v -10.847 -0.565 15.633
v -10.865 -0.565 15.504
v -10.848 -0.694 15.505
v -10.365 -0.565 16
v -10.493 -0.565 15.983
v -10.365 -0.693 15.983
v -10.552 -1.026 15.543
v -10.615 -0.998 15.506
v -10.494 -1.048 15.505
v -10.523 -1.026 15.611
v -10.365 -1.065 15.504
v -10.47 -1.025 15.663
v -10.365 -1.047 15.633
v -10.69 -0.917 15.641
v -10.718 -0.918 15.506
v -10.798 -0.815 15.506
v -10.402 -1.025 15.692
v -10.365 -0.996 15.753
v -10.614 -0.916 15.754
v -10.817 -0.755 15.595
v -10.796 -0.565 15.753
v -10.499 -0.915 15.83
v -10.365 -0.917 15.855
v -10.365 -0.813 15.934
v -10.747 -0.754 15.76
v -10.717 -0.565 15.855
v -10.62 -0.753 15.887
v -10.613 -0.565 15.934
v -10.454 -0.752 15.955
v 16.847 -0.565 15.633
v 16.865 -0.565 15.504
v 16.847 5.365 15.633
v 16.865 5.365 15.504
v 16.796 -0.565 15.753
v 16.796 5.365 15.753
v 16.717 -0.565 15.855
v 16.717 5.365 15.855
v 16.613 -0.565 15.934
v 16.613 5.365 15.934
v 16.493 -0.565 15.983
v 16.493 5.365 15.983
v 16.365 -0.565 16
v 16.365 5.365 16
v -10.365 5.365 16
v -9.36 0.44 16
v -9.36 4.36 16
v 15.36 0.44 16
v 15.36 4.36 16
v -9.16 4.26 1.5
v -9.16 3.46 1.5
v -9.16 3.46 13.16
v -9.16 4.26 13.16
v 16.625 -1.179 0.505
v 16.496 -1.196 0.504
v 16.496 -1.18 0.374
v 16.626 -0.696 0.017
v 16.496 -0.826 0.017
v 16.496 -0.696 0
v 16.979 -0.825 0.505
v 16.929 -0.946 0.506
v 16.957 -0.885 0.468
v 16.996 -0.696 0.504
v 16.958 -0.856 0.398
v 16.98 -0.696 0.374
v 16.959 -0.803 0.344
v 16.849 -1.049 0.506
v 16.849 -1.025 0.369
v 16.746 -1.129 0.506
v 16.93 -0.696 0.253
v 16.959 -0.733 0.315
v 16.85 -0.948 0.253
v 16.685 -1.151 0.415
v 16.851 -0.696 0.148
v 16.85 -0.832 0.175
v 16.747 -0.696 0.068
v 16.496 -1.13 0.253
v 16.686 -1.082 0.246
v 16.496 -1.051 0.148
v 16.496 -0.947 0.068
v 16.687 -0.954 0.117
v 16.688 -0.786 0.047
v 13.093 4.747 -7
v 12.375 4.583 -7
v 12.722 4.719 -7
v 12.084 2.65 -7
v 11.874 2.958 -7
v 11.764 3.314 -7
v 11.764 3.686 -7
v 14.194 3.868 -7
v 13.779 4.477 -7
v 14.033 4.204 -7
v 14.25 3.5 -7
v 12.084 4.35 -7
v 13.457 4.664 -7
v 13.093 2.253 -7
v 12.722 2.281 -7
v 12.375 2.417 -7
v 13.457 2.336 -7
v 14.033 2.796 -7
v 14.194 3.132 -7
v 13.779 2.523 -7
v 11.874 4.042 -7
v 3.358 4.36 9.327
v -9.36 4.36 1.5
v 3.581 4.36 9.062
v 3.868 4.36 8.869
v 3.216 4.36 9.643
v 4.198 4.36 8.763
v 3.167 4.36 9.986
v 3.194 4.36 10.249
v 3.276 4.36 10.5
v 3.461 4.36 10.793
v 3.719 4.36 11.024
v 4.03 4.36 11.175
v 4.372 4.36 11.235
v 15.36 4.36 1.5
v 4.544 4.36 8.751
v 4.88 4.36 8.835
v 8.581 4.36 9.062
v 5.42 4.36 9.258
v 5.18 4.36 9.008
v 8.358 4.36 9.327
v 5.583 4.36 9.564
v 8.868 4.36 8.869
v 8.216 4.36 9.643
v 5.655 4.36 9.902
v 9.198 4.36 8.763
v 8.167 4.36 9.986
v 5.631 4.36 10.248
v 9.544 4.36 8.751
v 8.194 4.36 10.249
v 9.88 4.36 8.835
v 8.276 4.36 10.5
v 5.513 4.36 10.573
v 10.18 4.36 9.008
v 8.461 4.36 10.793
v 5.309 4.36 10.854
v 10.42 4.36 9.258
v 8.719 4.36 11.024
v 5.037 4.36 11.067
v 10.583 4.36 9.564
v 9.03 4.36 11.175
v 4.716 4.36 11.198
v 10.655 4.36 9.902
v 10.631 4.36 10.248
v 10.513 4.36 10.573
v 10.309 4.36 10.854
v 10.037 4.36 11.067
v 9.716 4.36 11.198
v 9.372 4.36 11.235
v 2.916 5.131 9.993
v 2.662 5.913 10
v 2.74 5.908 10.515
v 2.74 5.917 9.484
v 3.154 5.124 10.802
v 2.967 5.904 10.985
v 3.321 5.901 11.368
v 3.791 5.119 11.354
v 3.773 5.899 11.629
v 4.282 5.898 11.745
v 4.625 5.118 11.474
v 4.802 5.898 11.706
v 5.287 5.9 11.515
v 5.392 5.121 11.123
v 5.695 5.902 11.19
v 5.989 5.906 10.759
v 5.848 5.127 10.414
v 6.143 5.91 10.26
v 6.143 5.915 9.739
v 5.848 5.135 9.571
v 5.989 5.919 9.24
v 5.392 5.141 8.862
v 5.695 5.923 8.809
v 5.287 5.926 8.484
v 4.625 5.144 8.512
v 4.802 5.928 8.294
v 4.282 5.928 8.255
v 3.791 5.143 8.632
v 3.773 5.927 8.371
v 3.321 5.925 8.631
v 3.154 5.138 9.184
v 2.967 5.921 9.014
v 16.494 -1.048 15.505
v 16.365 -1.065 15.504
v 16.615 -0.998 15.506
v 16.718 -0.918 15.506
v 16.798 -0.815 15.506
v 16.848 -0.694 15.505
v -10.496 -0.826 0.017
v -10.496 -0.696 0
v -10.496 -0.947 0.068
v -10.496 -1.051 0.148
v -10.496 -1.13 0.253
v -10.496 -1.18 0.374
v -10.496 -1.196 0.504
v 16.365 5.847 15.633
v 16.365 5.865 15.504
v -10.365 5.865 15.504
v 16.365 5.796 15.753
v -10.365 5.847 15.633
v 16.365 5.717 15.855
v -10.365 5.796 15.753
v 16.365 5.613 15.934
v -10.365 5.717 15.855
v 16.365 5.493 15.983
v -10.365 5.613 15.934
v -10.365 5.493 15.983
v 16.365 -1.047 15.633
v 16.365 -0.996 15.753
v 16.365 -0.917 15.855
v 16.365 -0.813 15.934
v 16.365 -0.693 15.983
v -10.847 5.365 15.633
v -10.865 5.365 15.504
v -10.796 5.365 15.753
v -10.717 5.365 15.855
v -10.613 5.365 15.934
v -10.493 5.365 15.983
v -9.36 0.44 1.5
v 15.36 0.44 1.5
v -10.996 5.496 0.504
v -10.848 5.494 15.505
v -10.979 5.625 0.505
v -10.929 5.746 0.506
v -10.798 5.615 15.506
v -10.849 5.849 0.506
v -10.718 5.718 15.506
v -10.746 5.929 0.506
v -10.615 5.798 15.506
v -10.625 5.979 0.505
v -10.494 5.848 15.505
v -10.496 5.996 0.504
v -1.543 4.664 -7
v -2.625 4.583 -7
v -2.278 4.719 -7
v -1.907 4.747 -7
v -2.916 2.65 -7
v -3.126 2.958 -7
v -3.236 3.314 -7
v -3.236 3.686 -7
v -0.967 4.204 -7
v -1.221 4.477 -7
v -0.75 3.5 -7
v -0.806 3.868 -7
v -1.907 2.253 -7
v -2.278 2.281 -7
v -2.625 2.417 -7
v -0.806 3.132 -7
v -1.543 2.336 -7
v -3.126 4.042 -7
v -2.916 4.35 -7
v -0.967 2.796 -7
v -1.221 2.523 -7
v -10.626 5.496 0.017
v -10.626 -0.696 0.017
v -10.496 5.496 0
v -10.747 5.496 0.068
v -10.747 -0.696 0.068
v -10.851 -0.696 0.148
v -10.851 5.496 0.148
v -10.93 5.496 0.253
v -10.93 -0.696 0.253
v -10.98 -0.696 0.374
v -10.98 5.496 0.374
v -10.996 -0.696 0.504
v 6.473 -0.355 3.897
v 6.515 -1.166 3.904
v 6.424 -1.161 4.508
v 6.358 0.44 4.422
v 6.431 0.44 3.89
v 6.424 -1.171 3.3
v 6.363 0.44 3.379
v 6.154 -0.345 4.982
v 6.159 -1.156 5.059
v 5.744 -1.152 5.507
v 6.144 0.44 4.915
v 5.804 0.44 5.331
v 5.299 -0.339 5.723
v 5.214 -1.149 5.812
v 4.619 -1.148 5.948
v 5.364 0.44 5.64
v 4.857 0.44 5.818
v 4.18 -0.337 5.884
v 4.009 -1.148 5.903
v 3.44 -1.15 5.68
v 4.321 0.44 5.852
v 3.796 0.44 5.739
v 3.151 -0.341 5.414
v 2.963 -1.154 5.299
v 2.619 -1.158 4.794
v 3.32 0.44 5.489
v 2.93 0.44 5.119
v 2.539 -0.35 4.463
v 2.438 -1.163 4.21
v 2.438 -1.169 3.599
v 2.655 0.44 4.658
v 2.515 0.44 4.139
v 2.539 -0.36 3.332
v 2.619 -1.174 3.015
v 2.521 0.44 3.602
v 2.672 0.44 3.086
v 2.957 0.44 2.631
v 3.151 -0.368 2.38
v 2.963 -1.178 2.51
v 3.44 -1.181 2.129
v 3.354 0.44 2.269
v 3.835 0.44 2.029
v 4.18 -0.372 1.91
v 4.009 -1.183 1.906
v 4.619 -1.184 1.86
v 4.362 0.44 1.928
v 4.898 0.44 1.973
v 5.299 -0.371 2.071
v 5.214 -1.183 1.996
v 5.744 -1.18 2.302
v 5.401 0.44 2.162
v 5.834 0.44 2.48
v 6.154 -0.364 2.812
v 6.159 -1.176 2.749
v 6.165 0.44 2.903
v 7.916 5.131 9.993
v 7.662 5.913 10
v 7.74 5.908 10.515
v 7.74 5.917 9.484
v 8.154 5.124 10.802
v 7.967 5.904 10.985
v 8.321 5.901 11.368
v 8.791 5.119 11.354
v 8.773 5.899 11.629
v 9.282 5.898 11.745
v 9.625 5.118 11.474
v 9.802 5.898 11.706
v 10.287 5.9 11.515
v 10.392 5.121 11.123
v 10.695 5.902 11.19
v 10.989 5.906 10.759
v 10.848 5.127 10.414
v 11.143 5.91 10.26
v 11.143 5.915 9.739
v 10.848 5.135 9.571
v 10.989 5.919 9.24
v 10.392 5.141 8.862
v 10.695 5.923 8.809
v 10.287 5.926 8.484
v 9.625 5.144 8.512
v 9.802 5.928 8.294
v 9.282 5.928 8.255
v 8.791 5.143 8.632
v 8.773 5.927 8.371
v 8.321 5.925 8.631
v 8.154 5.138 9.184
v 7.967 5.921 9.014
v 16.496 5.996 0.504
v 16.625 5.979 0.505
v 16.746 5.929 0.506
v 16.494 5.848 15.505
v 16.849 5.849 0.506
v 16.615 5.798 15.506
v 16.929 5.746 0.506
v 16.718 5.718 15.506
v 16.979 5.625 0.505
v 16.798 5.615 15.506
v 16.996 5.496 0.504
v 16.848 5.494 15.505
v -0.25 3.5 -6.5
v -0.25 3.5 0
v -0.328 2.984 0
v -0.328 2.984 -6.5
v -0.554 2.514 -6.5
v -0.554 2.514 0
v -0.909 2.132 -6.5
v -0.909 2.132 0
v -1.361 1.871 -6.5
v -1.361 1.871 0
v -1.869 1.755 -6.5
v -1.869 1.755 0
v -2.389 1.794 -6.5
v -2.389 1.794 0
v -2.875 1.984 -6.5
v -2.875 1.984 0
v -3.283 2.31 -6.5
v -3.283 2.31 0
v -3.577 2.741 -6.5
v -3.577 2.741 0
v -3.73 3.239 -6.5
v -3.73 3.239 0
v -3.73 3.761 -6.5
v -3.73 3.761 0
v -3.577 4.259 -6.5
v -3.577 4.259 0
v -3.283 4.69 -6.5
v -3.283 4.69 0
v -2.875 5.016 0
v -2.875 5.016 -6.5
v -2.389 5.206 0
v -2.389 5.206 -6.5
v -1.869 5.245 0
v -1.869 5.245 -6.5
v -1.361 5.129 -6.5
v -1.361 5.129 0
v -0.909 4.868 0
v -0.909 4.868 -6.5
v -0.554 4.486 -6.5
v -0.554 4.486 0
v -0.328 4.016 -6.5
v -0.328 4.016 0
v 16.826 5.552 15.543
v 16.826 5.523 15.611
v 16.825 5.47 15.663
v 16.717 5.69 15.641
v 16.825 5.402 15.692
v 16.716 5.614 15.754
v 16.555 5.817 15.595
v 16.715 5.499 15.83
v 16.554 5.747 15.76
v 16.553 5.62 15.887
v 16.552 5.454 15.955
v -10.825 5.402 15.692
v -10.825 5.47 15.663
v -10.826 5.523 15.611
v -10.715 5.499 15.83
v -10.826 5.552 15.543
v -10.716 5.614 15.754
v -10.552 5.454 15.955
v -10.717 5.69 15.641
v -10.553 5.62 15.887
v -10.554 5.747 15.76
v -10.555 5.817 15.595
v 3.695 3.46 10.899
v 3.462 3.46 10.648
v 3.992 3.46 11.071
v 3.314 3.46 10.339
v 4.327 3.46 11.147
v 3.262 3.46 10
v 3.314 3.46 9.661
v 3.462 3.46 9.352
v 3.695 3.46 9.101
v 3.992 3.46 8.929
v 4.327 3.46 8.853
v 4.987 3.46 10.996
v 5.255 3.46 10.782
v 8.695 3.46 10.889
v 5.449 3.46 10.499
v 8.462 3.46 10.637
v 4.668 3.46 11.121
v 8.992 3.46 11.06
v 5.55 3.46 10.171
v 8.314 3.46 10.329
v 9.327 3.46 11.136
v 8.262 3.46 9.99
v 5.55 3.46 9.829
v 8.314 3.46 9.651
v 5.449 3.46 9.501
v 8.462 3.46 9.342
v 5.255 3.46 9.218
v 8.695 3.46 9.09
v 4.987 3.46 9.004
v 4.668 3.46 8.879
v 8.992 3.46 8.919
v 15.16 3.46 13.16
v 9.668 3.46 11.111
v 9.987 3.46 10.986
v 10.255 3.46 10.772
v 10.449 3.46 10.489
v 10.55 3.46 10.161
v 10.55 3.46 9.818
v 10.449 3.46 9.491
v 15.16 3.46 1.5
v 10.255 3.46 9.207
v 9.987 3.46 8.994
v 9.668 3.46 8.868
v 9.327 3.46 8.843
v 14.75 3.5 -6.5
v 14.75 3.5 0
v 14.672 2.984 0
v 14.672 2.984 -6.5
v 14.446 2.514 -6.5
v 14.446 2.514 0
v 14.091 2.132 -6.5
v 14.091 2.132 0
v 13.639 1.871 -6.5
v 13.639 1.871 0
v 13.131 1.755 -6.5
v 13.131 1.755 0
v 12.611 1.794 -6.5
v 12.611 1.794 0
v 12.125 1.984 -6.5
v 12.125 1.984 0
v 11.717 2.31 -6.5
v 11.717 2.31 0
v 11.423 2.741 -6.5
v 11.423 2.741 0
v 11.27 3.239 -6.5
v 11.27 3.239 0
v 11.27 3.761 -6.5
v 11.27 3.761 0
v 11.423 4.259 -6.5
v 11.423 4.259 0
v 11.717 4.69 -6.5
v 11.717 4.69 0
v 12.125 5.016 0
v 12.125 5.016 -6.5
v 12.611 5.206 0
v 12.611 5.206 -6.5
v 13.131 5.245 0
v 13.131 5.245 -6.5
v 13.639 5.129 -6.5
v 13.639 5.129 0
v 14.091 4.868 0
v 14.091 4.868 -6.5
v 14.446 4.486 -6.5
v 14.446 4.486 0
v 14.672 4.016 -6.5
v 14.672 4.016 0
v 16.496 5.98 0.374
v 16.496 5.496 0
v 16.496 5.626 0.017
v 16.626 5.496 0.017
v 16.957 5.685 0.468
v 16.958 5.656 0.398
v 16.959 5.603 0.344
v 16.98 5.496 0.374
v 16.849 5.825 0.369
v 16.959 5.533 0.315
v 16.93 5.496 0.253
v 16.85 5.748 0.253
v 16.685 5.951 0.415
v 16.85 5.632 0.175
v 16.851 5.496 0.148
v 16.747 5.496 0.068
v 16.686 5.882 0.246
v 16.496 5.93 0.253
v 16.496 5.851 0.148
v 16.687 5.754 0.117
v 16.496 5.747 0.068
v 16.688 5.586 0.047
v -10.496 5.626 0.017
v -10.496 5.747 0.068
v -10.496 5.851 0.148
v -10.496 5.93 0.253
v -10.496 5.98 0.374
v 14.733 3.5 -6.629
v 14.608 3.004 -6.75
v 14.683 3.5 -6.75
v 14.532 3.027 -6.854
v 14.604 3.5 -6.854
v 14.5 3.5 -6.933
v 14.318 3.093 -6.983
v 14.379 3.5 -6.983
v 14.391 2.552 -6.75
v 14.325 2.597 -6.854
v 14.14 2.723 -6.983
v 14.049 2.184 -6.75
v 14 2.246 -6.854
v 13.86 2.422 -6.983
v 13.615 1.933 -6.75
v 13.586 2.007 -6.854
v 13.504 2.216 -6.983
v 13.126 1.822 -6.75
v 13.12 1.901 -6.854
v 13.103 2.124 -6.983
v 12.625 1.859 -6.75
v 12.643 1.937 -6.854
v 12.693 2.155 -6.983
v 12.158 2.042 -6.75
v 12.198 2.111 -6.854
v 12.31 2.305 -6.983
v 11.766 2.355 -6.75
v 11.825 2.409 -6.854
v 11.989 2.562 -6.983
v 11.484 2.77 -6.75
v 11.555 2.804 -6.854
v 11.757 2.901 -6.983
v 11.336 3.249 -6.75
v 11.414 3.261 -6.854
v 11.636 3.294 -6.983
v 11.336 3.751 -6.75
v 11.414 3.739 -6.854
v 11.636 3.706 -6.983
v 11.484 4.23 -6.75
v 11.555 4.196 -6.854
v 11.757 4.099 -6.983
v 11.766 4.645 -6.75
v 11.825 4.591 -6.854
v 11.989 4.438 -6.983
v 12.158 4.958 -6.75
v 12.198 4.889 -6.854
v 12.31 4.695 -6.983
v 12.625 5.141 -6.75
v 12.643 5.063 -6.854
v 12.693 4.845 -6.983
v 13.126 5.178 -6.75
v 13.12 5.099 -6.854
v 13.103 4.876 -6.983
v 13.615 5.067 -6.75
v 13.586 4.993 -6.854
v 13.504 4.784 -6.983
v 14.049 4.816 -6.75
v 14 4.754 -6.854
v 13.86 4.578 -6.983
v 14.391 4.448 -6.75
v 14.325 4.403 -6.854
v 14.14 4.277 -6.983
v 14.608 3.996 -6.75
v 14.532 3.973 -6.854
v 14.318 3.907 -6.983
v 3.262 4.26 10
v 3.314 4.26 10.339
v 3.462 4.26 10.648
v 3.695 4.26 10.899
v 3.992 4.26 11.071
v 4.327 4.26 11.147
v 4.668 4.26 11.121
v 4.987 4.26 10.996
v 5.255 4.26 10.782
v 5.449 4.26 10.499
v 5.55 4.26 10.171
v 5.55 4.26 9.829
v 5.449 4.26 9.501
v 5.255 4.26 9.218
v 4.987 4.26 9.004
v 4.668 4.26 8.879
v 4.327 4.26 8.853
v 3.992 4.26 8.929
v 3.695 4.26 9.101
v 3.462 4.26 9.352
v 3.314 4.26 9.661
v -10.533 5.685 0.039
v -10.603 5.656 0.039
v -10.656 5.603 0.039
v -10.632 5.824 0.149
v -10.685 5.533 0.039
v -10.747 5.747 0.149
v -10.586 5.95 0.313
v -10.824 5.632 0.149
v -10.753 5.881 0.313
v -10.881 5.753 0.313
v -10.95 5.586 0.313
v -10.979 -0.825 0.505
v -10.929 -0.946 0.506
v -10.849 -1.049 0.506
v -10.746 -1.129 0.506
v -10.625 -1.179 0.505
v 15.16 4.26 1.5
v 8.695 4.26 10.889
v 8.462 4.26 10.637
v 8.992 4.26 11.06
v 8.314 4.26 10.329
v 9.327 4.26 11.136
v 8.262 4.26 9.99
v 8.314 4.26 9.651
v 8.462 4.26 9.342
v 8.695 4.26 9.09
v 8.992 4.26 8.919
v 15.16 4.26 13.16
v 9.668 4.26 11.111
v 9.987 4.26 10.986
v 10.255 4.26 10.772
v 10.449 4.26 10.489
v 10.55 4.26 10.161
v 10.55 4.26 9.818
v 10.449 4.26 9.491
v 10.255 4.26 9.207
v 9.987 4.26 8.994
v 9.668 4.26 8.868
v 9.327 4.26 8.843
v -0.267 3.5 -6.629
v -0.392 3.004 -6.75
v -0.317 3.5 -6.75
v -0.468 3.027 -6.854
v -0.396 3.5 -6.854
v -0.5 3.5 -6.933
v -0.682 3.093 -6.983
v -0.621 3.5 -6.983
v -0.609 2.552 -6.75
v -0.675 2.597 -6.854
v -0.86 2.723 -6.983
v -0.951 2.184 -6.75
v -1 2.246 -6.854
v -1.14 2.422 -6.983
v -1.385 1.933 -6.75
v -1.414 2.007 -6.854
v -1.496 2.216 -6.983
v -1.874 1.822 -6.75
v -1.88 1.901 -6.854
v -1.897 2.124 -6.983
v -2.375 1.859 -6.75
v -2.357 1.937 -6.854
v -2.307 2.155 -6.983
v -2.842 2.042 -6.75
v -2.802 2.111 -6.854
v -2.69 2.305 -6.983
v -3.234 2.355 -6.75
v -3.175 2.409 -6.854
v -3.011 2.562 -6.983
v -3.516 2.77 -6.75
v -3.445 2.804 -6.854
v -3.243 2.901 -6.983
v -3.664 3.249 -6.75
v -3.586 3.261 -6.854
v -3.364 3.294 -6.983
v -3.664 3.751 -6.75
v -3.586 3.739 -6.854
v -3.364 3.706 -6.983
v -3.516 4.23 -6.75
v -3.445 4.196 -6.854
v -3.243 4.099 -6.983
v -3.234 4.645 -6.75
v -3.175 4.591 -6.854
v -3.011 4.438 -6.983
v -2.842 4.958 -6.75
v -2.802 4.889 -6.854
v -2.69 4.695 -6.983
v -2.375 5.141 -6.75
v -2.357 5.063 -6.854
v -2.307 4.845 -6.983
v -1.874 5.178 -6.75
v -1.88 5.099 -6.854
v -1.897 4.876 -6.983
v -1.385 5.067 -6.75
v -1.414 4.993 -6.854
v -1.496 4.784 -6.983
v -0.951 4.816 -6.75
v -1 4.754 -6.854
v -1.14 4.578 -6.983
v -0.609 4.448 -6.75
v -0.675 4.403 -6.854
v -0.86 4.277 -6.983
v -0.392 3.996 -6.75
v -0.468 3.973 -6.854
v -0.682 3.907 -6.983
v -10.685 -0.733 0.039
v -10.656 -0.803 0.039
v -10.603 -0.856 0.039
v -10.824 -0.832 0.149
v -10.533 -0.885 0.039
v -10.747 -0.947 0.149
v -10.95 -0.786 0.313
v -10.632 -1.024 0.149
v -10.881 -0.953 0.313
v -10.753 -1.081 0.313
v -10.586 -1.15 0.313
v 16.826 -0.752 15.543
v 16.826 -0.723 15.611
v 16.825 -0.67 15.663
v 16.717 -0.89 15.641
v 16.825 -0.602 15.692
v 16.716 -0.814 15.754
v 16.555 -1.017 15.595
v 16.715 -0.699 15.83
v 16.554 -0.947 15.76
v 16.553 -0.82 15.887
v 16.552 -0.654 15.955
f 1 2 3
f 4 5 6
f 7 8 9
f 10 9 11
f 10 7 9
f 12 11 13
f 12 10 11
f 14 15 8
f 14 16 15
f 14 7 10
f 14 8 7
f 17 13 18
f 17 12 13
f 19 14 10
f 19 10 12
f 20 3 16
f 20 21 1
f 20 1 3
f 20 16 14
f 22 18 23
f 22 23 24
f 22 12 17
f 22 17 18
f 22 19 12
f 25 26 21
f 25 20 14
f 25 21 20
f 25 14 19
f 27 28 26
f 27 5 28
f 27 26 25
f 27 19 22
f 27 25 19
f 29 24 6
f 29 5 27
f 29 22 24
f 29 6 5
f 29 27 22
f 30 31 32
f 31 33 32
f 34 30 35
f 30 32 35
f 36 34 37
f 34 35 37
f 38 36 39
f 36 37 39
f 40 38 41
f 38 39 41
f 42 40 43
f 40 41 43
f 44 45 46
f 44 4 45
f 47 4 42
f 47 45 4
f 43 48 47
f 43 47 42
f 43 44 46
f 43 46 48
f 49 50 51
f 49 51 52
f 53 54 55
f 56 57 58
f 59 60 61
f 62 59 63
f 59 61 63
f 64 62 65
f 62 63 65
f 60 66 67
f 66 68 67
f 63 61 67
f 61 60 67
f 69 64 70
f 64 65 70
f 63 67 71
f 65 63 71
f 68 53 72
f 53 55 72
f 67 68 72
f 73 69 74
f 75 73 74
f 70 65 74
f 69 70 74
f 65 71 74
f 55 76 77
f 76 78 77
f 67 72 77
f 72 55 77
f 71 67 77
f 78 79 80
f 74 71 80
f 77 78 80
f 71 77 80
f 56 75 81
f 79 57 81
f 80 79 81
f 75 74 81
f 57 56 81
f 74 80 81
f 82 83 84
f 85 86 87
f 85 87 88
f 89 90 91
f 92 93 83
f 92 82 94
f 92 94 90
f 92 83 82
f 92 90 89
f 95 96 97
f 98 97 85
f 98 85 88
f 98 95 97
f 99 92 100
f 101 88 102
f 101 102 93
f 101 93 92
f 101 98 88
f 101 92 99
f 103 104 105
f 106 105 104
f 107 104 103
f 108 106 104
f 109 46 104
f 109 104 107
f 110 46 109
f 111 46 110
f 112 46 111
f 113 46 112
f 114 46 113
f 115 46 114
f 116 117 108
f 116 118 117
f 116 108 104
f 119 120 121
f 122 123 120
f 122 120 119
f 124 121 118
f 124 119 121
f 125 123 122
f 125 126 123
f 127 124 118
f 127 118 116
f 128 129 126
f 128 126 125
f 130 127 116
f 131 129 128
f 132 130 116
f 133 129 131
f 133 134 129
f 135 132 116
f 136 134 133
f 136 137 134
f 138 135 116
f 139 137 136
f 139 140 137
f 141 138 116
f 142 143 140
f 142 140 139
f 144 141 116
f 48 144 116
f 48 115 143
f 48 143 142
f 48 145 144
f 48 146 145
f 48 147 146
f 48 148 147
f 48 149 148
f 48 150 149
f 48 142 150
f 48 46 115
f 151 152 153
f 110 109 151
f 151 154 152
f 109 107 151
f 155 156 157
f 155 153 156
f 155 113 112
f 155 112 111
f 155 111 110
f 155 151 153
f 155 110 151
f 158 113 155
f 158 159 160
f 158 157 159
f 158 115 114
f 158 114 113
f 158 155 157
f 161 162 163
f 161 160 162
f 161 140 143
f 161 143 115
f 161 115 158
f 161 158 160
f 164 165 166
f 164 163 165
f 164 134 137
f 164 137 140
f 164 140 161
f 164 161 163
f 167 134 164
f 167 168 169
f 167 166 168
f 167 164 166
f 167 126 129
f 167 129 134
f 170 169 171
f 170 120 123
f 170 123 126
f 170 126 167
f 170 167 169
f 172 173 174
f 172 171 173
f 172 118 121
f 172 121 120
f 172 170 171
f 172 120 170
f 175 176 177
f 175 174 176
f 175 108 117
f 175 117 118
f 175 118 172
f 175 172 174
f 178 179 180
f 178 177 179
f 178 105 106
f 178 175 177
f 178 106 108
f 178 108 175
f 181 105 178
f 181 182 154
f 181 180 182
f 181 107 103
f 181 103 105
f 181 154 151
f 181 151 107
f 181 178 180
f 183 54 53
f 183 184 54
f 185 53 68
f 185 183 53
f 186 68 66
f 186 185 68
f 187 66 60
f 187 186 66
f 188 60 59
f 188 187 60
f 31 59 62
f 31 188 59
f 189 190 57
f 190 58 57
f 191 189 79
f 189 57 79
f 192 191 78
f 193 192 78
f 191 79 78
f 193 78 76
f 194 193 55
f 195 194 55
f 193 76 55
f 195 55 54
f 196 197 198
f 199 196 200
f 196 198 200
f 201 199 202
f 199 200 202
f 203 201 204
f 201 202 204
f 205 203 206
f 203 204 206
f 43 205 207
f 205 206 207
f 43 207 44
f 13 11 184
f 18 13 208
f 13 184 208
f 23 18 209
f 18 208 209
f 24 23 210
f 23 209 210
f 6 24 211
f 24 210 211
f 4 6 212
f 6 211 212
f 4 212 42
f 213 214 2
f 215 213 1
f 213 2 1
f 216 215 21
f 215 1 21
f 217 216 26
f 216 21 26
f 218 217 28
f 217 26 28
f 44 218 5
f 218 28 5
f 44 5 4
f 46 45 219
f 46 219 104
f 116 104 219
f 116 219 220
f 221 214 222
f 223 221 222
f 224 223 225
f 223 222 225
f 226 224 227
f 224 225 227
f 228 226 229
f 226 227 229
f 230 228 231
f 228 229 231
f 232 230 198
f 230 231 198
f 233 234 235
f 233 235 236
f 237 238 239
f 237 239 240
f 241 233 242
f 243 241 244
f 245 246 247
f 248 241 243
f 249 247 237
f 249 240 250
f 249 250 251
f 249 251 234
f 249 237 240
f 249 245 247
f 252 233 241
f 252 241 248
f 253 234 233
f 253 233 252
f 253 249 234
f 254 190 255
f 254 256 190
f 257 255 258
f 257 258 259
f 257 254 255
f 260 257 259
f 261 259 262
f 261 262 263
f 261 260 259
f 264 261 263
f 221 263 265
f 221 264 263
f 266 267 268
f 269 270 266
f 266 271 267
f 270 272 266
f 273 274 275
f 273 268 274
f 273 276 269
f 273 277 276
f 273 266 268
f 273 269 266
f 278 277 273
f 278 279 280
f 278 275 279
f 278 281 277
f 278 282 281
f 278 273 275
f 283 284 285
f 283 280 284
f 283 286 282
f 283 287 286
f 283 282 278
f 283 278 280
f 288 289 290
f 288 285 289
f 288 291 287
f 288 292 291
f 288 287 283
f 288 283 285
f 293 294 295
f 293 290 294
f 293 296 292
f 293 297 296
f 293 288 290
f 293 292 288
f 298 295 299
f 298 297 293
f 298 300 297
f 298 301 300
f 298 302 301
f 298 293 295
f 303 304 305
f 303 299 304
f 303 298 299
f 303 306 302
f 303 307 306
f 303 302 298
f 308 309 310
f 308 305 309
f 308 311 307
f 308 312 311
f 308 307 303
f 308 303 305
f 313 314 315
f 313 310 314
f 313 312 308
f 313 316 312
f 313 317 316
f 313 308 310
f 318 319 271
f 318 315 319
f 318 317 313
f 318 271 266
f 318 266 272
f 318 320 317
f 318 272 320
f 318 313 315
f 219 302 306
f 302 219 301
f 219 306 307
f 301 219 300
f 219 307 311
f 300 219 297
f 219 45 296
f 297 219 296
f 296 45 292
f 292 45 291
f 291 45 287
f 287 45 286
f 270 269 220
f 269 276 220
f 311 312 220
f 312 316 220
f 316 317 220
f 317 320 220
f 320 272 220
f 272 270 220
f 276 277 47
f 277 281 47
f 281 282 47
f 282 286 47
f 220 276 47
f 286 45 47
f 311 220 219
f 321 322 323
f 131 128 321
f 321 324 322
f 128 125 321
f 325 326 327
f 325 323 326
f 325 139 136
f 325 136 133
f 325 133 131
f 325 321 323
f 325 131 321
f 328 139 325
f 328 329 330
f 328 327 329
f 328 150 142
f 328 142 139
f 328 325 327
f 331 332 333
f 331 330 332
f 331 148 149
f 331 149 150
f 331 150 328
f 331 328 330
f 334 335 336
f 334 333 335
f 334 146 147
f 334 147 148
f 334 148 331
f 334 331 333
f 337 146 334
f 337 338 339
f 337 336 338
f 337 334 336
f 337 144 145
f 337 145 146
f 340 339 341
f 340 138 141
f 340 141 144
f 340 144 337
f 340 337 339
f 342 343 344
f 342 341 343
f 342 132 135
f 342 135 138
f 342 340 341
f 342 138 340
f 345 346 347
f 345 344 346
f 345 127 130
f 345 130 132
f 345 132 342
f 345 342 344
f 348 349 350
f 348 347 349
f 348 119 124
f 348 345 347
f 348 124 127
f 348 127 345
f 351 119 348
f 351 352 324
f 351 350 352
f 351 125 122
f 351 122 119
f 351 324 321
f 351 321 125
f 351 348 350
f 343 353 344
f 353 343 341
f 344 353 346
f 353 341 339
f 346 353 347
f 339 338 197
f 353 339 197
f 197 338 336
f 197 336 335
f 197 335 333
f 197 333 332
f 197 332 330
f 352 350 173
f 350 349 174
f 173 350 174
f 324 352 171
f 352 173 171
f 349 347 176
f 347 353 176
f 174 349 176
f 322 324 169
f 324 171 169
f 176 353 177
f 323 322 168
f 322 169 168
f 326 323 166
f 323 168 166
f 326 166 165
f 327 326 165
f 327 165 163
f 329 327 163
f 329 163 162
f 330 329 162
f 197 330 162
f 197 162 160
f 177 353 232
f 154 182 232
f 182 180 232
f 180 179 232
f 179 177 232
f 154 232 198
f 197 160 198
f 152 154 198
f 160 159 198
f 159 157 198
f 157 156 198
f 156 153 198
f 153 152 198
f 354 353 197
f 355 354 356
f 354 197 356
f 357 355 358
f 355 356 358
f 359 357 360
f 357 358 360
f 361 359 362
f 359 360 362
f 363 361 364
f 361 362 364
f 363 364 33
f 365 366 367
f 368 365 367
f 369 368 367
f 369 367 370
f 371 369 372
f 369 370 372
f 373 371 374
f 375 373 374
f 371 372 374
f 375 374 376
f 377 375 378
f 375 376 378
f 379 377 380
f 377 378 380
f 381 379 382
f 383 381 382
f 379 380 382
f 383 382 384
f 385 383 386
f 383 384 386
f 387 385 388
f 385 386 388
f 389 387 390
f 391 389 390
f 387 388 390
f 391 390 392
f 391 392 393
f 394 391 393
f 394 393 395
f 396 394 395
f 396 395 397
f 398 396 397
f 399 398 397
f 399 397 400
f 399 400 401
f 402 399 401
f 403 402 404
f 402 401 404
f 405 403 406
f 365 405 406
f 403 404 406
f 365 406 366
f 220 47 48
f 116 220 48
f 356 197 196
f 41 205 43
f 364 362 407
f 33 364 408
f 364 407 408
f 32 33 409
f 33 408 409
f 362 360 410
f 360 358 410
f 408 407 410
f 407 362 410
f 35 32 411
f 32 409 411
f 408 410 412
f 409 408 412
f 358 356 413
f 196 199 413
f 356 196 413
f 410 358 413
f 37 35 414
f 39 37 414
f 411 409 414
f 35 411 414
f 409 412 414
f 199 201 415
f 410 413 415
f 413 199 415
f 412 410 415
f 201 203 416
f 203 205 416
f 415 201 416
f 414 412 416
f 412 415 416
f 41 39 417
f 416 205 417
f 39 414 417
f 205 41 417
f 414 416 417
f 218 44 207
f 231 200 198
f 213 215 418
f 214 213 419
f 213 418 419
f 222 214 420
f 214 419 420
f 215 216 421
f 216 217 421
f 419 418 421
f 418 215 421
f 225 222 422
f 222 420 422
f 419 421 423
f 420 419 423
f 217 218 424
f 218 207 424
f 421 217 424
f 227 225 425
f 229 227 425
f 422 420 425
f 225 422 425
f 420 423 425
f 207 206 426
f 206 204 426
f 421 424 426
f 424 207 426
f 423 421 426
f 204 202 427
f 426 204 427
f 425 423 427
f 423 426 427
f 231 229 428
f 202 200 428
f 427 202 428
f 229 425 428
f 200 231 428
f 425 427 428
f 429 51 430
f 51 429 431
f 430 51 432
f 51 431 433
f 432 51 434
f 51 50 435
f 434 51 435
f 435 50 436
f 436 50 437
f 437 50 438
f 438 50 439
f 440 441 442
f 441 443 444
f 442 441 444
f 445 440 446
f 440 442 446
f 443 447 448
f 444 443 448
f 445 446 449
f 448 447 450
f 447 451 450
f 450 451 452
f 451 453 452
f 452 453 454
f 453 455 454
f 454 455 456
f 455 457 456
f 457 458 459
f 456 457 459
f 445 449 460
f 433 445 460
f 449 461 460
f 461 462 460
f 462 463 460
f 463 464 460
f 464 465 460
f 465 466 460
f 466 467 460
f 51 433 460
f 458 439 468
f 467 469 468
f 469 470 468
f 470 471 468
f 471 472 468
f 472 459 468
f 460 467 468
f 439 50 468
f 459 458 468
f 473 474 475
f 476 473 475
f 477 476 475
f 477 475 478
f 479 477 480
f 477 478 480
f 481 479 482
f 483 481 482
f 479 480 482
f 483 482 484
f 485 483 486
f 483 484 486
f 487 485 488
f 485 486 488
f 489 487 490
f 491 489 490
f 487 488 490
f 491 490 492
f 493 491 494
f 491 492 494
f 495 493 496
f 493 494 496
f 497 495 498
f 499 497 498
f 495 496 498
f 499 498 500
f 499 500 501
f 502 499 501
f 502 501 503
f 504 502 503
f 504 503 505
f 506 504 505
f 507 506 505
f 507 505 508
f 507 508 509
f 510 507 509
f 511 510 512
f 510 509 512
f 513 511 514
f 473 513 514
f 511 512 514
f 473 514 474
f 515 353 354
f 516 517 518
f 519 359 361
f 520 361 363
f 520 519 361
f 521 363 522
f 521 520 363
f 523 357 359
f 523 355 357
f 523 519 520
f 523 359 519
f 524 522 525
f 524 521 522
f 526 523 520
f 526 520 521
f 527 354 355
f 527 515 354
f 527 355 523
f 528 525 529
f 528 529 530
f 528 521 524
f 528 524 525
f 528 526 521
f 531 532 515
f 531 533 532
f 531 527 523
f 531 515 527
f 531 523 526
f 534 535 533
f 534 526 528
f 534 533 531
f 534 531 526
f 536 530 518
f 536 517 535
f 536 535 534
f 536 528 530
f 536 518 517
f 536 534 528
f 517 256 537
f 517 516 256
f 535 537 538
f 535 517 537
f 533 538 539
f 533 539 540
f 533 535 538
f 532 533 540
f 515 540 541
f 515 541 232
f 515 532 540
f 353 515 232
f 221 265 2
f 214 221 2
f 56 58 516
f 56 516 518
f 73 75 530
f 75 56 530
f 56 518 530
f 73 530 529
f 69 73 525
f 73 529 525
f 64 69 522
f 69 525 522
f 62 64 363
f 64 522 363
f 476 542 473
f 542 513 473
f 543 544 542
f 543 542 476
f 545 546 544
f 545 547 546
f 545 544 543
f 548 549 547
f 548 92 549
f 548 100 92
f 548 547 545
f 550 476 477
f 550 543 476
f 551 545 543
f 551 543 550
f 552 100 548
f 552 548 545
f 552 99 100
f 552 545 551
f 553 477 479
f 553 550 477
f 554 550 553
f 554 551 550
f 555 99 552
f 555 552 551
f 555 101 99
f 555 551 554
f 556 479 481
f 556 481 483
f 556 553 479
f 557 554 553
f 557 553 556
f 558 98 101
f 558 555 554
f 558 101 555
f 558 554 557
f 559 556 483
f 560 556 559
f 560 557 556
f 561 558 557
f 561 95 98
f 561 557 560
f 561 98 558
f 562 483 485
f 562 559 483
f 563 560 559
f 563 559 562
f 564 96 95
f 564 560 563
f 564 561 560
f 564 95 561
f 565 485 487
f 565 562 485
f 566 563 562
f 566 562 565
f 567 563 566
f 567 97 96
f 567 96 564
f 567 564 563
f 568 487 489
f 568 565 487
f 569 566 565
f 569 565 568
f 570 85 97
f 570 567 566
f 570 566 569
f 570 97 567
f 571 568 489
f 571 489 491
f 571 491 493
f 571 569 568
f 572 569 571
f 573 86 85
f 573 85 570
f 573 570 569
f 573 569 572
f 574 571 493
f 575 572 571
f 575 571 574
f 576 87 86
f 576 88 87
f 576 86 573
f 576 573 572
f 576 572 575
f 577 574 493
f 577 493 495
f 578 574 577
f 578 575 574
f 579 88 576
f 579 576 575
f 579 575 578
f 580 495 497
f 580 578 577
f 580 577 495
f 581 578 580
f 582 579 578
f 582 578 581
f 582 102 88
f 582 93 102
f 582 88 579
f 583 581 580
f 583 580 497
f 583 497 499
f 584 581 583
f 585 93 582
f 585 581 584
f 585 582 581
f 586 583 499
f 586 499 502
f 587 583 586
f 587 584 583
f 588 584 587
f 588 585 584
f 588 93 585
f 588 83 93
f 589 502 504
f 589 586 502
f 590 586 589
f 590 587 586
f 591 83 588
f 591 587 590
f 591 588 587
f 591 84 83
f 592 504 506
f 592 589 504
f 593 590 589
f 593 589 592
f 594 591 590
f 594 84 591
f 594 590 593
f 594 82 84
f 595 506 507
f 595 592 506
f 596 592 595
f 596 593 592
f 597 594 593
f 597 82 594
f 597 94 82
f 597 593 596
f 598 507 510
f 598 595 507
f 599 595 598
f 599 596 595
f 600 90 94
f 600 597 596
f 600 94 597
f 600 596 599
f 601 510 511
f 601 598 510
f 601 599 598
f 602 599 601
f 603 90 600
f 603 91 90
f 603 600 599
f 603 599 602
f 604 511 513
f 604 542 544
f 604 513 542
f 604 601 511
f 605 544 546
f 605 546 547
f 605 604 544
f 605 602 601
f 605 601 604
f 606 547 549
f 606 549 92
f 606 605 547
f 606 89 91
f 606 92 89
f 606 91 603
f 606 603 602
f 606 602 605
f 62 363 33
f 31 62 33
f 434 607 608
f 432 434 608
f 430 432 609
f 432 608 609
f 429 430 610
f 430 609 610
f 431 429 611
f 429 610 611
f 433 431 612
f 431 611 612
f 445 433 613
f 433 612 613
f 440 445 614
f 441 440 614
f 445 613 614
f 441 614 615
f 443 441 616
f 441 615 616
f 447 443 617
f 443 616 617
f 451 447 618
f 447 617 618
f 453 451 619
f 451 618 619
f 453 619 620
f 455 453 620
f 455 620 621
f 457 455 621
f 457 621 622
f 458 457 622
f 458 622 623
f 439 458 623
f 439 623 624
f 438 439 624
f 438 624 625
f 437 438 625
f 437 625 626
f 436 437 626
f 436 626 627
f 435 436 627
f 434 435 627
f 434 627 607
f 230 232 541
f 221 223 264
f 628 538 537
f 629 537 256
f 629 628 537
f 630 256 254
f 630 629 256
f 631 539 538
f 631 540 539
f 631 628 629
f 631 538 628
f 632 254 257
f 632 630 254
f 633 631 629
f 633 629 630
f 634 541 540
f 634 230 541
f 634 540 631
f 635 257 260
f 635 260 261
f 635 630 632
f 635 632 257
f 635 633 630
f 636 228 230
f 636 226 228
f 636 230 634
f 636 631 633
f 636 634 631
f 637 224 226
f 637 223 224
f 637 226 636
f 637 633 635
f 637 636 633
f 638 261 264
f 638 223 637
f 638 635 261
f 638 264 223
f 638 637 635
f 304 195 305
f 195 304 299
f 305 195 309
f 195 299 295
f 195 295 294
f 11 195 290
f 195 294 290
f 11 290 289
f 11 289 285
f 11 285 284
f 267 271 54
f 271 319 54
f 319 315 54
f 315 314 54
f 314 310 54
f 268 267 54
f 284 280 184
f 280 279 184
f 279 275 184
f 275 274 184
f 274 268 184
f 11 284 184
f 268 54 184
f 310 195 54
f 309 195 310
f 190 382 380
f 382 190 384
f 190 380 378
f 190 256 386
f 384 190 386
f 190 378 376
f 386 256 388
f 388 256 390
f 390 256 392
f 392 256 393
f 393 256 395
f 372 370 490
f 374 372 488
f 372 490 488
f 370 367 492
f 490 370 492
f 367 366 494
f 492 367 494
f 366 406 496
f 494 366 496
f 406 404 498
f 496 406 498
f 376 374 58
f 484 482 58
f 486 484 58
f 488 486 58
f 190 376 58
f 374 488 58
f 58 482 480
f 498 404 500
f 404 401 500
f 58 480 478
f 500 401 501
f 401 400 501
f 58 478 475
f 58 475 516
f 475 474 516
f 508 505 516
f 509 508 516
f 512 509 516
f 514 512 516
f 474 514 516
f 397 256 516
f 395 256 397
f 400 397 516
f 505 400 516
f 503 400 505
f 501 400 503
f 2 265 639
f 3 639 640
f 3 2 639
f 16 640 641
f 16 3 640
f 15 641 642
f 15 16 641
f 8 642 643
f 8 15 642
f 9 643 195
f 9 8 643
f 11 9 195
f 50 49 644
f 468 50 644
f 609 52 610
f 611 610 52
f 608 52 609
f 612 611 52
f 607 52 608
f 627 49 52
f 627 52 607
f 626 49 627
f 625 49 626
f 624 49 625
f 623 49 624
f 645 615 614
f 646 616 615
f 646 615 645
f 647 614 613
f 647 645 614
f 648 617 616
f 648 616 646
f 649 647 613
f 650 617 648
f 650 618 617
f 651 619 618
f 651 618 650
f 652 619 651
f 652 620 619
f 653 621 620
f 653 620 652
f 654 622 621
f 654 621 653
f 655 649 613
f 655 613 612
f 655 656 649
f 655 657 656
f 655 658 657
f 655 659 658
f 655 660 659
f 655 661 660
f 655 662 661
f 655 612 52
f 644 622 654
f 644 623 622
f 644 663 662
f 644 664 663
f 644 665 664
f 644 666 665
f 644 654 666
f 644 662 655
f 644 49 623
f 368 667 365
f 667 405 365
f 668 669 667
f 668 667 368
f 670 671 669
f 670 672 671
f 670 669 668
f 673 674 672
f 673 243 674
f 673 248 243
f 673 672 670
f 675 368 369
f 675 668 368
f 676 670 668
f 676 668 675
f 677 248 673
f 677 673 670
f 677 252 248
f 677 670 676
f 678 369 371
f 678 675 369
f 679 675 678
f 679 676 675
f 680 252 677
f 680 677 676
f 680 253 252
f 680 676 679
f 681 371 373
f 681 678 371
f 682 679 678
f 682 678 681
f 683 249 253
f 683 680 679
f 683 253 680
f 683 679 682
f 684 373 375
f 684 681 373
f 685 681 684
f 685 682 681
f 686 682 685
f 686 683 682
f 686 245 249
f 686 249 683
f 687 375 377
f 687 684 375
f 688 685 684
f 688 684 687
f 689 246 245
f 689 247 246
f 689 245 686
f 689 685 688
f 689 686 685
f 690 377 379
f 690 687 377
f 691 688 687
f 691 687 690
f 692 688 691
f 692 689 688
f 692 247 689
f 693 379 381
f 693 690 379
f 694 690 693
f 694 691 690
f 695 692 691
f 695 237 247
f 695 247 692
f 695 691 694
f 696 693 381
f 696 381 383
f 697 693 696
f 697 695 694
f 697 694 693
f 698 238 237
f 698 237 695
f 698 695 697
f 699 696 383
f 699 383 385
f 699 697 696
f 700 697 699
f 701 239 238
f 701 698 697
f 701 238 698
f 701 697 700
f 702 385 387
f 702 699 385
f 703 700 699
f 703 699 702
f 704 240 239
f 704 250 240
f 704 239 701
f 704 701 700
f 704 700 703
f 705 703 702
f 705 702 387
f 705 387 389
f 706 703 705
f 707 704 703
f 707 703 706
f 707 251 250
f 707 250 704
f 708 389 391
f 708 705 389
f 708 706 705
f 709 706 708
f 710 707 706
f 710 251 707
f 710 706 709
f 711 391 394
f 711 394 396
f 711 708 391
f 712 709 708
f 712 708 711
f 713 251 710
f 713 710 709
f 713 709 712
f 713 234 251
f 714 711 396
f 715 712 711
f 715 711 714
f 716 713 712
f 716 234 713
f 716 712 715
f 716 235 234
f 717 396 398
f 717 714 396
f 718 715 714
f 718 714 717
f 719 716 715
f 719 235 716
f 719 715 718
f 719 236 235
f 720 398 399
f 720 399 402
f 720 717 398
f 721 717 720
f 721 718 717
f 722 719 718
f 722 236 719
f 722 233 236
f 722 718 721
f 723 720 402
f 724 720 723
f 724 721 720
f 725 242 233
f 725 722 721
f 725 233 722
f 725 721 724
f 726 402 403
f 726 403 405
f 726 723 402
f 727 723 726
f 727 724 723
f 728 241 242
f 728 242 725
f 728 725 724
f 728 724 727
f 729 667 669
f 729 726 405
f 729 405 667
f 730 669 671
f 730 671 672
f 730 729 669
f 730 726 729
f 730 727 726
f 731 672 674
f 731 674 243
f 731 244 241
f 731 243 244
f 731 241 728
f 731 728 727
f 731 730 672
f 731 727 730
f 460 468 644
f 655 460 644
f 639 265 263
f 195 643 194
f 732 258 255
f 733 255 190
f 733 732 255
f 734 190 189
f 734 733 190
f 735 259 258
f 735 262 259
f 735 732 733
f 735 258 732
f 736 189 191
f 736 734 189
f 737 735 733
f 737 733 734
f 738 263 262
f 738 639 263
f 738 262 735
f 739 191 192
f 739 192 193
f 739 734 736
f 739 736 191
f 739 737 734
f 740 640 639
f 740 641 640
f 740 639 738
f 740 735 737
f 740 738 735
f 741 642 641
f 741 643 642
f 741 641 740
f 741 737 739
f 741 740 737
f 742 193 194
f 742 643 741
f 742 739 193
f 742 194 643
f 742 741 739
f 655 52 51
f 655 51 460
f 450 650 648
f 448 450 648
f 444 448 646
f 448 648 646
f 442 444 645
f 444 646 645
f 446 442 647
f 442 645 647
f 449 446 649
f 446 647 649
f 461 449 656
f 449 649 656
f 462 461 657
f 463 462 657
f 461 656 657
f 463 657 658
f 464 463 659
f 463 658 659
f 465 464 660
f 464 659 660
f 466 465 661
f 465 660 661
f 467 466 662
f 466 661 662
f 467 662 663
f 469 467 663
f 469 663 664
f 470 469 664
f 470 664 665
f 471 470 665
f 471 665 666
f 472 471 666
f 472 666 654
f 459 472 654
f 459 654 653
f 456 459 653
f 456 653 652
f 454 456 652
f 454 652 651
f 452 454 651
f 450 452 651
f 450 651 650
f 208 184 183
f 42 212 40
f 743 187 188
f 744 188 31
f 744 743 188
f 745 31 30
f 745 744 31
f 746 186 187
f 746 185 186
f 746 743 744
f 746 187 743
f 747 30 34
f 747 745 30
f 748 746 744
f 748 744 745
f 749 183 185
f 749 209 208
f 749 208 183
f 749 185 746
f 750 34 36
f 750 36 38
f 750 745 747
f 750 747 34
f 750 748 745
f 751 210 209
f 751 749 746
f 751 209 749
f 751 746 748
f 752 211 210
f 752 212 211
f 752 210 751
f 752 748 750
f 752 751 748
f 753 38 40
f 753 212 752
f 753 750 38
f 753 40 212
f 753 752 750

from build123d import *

# Parameters (mm, degrees)
F0_W      = 28
F0_H      = 7.2
F1_DEPTH  = 16
F1_TAPER  = 0.5
F3_R      = 1.75
F4_DEPTH  = 7
F5_R      = 1.75
F6_DEPTH  = 1.6
F6_TAPER  = 18
F7_R      = 1.75
F8_DEPTH  = 1.7
F8_TAPER  = 18
F2_W      = 24.7207402307
F2_H      = 3.9207402307
F9_DEPTH  = 14.5
F10_W     = 24.3207402307
F10_H     = 0.8
F11_DEPTH = 11.66
F12_R     = 1.15
F13_DEPTH = 1
F14_R     = 0.5
F15_R     = 2.05
F16_DEPTH = 1.8
F16_TAPER = 3


with BuildPart() as f1:
    # F0 (on Top) → F1 (new body)
    with BuildSketch(Plane.XY):
        with Locations((3, 2.4)):
            Rectangle(F0_W, F0_H)
    extrude(amount=F1_DEPTH, taper=F1_TAPER)

    # F3 (on face) → F4 (join)
    with BuildSketch(Plane(origin=(0, 0, 0), x_dir=(1, 0, 0), z_dir=(0, 0, -1))):
        with Locations((13, -3.5)):
            Circle(F3_R)
        with Locations((-2, -3.5)):
            Circle(F3_R)
    extrude(amount=F4_DEPTH)

    # F5 (on face) → F6 (cut)
    with BuildSketch(Plane(origin=(0, 5.9995430855, 0.0523572193), x_dir=(-1, 0, 0), z_dir=(0, 0.9999619231, 0.0087265355))):
        with Locations((-6.7264116369, 22.8813774884)):
            Circle(F5_R)
    extrude(amount=-F6_DEPTH, taper=F6_TAPER, mode=Mode.SUBTRACT)

    # F7 (on face) → F8 (cut)
    with BuildSketch(Plane(origin=(0, 5.9995430855, 0.0523572193), x_dir=(-1, 0, 0), z_dir=(0, 0.9999619231, 0.0087265355))):
        with Locations((-9.4124490789, 9.947640787)):
            Circle(F7_R)
        with Locations((-4.4124490789, 9.947640787)):
            Circle(F7_R)
    extrude(amount=-F8_DEPTH, taper=F8_TAPER, mode=Mode.SUBTRACT)

    # F2 (on face) → F9 (cut)
    with BuildSketch(Plane.XY.offset(16)):
        with Locations((3, 2.4)):
            Rectangle(F2_W, F2_H)
    extrude(amount=-F9_DEPTH, mode=Mode.SUBTRACT)

    # F14
    f14_edges = [f1.edges().sort_by_distance(p)[0] for p in [
        (3, 5.86037, 16),
        (-10.86037, 2.4, 16),
        (-10.930185, 5.930185, 8),
        (3, 6, 0),
        (16.930185, 5.930185, 8),
        (-10.930185, -1.130185, 8),
        (-11, 2.4, 0),
        (3, -1.2, 0),
        (3, -1.06037, 16),
        (16.930185, -1.130185, 8),
        (16.86037, 2.4, 16),
        (17, 2.4, 0),
        (-3.75, 3.5, -7),
        (11.25, 3.5, -7),
    ]]
    fillet(f14_edges, radius=F14_R)

    # F15 (on face) → F16 (cut)
    with BuildSketch(Plane(origin=(0, -1.1999086171, 0.0104714439), x_dir=(1, 0, 0), z_dir=(0, -0.9999619231, 0.0087265355))):
        with Locations((4.4654902328, 3.893929669)):
            Circle(F15_R)
    extrude(amount=-F16_DEPTH, taper=F16_TAPER, mode=Mode.SUBTRACT)


with BuildPart() as f11:
    # F10 (on face) → F11 (new body)
    with BuildSketch(Plane.XY.offset(1.5)):
        with Locations((3, 3.8603701153)):
            Rectangle(F10_W, F10_H)
    extrude(amount=F11_DEPTH)

    # F12 (on face) → F13 (cut)
    with BuildSketch(Plane(origin=(0, 4.2603701153, 0), x_dir=(-1, 0, 0), z_dir=(0, 1, 0))):
        with Locations((-9.4124490789, 9.9896040143)):
            Circle(F12_R)
        with Locations((-4.4124490789, 10)):
            Circle(F12_R)
    extrude(amount=-F13_DEPTH, mode=Mode.SUBTRACT)


solid = Compound([f1.part, f11.part])
